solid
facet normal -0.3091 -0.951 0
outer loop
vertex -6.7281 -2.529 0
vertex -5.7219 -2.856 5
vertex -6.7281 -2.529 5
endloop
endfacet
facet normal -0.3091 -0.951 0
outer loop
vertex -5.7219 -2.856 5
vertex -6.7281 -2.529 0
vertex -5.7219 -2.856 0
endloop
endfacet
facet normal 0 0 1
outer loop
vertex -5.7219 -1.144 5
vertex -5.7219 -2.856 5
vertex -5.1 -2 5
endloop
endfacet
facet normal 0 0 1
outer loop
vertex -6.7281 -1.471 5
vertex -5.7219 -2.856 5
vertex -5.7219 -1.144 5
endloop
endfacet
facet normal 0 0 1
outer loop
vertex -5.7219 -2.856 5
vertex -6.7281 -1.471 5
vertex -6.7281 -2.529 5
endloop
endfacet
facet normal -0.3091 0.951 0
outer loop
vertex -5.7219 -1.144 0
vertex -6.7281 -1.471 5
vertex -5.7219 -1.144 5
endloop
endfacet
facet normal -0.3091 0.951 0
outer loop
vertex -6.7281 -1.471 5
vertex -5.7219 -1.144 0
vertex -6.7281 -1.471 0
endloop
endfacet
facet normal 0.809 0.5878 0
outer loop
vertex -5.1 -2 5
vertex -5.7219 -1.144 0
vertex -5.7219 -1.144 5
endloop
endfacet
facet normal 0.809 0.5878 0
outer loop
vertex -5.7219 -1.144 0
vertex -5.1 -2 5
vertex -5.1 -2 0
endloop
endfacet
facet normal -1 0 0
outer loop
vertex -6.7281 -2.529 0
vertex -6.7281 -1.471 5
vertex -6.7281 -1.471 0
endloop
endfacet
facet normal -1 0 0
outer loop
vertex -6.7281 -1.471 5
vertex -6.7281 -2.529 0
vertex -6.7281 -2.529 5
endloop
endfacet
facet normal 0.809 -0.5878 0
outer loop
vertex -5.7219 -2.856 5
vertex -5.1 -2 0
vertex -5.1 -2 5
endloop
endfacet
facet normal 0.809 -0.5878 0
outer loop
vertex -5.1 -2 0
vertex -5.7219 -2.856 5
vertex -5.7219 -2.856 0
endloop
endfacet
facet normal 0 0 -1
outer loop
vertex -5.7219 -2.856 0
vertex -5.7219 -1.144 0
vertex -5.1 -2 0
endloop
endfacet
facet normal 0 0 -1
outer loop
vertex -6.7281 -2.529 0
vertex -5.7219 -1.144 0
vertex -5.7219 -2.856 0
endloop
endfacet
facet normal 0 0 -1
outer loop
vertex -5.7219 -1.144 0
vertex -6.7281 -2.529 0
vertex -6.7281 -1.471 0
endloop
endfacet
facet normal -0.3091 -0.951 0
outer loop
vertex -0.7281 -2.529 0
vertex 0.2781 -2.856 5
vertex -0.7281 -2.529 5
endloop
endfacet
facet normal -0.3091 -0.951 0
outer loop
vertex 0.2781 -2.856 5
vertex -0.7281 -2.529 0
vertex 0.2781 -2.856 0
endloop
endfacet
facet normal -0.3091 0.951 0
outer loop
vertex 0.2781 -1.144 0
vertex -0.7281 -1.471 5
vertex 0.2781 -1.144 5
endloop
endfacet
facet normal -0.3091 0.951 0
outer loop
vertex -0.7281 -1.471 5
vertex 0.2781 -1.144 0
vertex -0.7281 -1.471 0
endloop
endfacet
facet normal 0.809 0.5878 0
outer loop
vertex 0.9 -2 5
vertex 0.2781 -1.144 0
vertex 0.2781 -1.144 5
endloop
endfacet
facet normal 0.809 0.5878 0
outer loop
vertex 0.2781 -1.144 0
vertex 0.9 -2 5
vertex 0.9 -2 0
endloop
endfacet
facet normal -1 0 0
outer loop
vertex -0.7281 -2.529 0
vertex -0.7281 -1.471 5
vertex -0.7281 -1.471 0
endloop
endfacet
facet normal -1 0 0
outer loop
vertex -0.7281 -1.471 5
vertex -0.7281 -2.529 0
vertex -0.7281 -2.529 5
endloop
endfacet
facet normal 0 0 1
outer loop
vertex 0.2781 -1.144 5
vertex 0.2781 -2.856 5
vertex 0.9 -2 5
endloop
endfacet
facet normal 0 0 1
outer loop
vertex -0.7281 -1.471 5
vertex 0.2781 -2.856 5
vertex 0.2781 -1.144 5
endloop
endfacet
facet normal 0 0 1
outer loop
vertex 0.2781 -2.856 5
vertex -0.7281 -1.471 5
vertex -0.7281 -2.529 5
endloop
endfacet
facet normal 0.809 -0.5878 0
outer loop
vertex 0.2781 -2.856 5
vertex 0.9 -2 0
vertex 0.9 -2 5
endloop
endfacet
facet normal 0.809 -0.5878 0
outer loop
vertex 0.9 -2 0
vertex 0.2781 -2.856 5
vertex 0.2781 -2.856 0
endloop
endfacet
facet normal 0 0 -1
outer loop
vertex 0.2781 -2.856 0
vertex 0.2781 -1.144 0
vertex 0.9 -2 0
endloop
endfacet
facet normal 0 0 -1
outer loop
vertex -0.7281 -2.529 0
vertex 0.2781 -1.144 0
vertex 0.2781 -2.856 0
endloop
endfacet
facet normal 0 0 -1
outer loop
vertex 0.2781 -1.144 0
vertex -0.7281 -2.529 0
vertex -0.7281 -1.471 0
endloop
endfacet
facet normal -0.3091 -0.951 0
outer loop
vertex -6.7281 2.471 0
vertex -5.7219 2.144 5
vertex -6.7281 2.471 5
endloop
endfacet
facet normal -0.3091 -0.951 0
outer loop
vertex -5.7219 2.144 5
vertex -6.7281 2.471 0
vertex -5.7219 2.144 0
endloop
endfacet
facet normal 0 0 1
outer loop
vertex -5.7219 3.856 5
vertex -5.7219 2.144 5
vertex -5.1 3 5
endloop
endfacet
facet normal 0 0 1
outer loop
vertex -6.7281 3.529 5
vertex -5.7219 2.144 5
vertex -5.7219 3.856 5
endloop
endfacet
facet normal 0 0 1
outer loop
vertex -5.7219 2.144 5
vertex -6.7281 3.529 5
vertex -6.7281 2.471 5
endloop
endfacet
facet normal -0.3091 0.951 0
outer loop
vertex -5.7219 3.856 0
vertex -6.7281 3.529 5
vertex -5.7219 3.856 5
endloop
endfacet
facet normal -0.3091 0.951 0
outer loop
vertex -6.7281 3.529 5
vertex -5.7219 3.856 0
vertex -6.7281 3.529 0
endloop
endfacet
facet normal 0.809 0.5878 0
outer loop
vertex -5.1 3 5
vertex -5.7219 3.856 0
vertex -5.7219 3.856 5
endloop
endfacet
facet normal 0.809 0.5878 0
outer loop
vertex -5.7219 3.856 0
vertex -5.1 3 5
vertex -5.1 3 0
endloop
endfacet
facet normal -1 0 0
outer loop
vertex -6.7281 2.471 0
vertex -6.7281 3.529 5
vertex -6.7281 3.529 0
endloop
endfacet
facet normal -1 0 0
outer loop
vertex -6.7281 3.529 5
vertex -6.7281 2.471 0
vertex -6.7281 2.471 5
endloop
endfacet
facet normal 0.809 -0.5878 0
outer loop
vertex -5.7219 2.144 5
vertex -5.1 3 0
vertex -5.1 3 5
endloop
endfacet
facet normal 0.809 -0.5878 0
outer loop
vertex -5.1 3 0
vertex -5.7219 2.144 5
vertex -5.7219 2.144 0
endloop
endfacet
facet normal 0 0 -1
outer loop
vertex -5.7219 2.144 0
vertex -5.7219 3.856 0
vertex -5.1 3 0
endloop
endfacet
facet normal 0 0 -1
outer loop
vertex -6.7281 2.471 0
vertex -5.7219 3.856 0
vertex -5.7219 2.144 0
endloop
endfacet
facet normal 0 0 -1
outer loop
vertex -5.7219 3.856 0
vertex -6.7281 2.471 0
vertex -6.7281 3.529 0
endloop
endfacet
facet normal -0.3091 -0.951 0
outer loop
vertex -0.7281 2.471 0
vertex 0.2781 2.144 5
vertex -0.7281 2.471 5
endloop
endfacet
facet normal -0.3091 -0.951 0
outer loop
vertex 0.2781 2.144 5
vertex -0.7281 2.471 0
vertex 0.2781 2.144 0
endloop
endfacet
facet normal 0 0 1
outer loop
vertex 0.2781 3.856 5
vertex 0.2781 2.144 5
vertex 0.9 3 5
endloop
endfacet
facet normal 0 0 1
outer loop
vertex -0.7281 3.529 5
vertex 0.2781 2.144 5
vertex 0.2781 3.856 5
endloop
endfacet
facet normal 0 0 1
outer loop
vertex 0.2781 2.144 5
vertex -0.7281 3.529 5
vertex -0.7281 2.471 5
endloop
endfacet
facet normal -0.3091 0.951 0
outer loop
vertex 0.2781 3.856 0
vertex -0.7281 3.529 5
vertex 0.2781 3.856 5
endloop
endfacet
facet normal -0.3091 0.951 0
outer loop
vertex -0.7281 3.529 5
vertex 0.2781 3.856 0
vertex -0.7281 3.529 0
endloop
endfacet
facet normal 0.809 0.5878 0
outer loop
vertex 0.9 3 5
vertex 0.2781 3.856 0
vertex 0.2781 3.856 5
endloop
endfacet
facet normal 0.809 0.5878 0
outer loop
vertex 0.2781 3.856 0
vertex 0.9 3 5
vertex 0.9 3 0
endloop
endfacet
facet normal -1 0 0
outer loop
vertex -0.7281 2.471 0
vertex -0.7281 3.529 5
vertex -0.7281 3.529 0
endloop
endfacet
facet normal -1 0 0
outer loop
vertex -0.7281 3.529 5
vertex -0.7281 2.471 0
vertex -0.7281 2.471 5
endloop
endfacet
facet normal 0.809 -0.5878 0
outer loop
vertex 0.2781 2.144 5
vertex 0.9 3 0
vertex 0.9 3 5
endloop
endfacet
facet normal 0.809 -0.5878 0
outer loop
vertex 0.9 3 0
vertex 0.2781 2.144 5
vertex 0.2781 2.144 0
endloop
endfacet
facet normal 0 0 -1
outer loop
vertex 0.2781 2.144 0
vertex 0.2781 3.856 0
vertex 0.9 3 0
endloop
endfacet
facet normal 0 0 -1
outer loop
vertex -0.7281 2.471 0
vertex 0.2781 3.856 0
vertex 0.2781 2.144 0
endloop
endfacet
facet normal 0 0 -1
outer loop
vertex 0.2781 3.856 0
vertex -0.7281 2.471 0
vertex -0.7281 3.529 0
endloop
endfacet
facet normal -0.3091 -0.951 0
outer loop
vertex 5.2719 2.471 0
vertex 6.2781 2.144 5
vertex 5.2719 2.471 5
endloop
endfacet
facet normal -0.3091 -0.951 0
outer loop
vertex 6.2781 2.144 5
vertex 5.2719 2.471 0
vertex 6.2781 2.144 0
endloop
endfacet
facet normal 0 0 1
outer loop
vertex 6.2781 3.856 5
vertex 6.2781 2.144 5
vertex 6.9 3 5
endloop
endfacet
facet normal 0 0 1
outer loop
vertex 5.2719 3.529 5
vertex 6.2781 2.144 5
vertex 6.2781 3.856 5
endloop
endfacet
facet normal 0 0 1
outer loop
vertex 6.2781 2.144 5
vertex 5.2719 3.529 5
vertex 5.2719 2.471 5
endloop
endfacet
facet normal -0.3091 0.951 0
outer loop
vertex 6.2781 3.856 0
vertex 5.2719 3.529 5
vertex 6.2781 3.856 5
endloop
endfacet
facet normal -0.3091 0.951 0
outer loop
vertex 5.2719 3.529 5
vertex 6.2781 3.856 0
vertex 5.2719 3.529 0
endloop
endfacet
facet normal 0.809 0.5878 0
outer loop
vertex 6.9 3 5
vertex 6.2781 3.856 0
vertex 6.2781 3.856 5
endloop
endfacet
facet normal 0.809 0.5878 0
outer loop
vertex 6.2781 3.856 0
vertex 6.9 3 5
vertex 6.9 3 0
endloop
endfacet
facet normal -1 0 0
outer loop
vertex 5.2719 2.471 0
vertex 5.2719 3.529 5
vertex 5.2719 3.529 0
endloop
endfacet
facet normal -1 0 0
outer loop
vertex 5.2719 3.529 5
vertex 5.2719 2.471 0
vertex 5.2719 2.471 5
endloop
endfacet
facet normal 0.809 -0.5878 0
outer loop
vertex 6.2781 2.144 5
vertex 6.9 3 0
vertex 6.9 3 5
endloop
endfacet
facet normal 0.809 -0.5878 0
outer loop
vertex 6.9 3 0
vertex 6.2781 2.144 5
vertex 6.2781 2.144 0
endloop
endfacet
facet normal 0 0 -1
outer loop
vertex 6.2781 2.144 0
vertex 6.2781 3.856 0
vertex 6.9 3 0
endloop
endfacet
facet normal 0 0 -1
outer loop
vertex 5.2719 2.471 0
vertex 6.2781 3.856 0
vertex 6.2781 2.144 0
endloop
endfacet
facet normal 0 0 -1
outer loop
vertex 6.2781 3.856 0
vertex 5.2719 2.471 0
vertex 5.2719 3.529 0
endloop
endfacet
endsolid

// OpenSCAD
union() {
	translate([-6, -2, 0]) cylinder(r=0.9, h=5);
	translate([0, -2, 0]) cylinder(r=0.9, h=5);
	translate([-6, 3, 0]) cylinder(r=0.9, h=5);
	translate([0, 3, 0]) cylinder(r=0.9, h=5);
	translate([6, 3, 0]) cylinder(r=0.9, h=5);
}
